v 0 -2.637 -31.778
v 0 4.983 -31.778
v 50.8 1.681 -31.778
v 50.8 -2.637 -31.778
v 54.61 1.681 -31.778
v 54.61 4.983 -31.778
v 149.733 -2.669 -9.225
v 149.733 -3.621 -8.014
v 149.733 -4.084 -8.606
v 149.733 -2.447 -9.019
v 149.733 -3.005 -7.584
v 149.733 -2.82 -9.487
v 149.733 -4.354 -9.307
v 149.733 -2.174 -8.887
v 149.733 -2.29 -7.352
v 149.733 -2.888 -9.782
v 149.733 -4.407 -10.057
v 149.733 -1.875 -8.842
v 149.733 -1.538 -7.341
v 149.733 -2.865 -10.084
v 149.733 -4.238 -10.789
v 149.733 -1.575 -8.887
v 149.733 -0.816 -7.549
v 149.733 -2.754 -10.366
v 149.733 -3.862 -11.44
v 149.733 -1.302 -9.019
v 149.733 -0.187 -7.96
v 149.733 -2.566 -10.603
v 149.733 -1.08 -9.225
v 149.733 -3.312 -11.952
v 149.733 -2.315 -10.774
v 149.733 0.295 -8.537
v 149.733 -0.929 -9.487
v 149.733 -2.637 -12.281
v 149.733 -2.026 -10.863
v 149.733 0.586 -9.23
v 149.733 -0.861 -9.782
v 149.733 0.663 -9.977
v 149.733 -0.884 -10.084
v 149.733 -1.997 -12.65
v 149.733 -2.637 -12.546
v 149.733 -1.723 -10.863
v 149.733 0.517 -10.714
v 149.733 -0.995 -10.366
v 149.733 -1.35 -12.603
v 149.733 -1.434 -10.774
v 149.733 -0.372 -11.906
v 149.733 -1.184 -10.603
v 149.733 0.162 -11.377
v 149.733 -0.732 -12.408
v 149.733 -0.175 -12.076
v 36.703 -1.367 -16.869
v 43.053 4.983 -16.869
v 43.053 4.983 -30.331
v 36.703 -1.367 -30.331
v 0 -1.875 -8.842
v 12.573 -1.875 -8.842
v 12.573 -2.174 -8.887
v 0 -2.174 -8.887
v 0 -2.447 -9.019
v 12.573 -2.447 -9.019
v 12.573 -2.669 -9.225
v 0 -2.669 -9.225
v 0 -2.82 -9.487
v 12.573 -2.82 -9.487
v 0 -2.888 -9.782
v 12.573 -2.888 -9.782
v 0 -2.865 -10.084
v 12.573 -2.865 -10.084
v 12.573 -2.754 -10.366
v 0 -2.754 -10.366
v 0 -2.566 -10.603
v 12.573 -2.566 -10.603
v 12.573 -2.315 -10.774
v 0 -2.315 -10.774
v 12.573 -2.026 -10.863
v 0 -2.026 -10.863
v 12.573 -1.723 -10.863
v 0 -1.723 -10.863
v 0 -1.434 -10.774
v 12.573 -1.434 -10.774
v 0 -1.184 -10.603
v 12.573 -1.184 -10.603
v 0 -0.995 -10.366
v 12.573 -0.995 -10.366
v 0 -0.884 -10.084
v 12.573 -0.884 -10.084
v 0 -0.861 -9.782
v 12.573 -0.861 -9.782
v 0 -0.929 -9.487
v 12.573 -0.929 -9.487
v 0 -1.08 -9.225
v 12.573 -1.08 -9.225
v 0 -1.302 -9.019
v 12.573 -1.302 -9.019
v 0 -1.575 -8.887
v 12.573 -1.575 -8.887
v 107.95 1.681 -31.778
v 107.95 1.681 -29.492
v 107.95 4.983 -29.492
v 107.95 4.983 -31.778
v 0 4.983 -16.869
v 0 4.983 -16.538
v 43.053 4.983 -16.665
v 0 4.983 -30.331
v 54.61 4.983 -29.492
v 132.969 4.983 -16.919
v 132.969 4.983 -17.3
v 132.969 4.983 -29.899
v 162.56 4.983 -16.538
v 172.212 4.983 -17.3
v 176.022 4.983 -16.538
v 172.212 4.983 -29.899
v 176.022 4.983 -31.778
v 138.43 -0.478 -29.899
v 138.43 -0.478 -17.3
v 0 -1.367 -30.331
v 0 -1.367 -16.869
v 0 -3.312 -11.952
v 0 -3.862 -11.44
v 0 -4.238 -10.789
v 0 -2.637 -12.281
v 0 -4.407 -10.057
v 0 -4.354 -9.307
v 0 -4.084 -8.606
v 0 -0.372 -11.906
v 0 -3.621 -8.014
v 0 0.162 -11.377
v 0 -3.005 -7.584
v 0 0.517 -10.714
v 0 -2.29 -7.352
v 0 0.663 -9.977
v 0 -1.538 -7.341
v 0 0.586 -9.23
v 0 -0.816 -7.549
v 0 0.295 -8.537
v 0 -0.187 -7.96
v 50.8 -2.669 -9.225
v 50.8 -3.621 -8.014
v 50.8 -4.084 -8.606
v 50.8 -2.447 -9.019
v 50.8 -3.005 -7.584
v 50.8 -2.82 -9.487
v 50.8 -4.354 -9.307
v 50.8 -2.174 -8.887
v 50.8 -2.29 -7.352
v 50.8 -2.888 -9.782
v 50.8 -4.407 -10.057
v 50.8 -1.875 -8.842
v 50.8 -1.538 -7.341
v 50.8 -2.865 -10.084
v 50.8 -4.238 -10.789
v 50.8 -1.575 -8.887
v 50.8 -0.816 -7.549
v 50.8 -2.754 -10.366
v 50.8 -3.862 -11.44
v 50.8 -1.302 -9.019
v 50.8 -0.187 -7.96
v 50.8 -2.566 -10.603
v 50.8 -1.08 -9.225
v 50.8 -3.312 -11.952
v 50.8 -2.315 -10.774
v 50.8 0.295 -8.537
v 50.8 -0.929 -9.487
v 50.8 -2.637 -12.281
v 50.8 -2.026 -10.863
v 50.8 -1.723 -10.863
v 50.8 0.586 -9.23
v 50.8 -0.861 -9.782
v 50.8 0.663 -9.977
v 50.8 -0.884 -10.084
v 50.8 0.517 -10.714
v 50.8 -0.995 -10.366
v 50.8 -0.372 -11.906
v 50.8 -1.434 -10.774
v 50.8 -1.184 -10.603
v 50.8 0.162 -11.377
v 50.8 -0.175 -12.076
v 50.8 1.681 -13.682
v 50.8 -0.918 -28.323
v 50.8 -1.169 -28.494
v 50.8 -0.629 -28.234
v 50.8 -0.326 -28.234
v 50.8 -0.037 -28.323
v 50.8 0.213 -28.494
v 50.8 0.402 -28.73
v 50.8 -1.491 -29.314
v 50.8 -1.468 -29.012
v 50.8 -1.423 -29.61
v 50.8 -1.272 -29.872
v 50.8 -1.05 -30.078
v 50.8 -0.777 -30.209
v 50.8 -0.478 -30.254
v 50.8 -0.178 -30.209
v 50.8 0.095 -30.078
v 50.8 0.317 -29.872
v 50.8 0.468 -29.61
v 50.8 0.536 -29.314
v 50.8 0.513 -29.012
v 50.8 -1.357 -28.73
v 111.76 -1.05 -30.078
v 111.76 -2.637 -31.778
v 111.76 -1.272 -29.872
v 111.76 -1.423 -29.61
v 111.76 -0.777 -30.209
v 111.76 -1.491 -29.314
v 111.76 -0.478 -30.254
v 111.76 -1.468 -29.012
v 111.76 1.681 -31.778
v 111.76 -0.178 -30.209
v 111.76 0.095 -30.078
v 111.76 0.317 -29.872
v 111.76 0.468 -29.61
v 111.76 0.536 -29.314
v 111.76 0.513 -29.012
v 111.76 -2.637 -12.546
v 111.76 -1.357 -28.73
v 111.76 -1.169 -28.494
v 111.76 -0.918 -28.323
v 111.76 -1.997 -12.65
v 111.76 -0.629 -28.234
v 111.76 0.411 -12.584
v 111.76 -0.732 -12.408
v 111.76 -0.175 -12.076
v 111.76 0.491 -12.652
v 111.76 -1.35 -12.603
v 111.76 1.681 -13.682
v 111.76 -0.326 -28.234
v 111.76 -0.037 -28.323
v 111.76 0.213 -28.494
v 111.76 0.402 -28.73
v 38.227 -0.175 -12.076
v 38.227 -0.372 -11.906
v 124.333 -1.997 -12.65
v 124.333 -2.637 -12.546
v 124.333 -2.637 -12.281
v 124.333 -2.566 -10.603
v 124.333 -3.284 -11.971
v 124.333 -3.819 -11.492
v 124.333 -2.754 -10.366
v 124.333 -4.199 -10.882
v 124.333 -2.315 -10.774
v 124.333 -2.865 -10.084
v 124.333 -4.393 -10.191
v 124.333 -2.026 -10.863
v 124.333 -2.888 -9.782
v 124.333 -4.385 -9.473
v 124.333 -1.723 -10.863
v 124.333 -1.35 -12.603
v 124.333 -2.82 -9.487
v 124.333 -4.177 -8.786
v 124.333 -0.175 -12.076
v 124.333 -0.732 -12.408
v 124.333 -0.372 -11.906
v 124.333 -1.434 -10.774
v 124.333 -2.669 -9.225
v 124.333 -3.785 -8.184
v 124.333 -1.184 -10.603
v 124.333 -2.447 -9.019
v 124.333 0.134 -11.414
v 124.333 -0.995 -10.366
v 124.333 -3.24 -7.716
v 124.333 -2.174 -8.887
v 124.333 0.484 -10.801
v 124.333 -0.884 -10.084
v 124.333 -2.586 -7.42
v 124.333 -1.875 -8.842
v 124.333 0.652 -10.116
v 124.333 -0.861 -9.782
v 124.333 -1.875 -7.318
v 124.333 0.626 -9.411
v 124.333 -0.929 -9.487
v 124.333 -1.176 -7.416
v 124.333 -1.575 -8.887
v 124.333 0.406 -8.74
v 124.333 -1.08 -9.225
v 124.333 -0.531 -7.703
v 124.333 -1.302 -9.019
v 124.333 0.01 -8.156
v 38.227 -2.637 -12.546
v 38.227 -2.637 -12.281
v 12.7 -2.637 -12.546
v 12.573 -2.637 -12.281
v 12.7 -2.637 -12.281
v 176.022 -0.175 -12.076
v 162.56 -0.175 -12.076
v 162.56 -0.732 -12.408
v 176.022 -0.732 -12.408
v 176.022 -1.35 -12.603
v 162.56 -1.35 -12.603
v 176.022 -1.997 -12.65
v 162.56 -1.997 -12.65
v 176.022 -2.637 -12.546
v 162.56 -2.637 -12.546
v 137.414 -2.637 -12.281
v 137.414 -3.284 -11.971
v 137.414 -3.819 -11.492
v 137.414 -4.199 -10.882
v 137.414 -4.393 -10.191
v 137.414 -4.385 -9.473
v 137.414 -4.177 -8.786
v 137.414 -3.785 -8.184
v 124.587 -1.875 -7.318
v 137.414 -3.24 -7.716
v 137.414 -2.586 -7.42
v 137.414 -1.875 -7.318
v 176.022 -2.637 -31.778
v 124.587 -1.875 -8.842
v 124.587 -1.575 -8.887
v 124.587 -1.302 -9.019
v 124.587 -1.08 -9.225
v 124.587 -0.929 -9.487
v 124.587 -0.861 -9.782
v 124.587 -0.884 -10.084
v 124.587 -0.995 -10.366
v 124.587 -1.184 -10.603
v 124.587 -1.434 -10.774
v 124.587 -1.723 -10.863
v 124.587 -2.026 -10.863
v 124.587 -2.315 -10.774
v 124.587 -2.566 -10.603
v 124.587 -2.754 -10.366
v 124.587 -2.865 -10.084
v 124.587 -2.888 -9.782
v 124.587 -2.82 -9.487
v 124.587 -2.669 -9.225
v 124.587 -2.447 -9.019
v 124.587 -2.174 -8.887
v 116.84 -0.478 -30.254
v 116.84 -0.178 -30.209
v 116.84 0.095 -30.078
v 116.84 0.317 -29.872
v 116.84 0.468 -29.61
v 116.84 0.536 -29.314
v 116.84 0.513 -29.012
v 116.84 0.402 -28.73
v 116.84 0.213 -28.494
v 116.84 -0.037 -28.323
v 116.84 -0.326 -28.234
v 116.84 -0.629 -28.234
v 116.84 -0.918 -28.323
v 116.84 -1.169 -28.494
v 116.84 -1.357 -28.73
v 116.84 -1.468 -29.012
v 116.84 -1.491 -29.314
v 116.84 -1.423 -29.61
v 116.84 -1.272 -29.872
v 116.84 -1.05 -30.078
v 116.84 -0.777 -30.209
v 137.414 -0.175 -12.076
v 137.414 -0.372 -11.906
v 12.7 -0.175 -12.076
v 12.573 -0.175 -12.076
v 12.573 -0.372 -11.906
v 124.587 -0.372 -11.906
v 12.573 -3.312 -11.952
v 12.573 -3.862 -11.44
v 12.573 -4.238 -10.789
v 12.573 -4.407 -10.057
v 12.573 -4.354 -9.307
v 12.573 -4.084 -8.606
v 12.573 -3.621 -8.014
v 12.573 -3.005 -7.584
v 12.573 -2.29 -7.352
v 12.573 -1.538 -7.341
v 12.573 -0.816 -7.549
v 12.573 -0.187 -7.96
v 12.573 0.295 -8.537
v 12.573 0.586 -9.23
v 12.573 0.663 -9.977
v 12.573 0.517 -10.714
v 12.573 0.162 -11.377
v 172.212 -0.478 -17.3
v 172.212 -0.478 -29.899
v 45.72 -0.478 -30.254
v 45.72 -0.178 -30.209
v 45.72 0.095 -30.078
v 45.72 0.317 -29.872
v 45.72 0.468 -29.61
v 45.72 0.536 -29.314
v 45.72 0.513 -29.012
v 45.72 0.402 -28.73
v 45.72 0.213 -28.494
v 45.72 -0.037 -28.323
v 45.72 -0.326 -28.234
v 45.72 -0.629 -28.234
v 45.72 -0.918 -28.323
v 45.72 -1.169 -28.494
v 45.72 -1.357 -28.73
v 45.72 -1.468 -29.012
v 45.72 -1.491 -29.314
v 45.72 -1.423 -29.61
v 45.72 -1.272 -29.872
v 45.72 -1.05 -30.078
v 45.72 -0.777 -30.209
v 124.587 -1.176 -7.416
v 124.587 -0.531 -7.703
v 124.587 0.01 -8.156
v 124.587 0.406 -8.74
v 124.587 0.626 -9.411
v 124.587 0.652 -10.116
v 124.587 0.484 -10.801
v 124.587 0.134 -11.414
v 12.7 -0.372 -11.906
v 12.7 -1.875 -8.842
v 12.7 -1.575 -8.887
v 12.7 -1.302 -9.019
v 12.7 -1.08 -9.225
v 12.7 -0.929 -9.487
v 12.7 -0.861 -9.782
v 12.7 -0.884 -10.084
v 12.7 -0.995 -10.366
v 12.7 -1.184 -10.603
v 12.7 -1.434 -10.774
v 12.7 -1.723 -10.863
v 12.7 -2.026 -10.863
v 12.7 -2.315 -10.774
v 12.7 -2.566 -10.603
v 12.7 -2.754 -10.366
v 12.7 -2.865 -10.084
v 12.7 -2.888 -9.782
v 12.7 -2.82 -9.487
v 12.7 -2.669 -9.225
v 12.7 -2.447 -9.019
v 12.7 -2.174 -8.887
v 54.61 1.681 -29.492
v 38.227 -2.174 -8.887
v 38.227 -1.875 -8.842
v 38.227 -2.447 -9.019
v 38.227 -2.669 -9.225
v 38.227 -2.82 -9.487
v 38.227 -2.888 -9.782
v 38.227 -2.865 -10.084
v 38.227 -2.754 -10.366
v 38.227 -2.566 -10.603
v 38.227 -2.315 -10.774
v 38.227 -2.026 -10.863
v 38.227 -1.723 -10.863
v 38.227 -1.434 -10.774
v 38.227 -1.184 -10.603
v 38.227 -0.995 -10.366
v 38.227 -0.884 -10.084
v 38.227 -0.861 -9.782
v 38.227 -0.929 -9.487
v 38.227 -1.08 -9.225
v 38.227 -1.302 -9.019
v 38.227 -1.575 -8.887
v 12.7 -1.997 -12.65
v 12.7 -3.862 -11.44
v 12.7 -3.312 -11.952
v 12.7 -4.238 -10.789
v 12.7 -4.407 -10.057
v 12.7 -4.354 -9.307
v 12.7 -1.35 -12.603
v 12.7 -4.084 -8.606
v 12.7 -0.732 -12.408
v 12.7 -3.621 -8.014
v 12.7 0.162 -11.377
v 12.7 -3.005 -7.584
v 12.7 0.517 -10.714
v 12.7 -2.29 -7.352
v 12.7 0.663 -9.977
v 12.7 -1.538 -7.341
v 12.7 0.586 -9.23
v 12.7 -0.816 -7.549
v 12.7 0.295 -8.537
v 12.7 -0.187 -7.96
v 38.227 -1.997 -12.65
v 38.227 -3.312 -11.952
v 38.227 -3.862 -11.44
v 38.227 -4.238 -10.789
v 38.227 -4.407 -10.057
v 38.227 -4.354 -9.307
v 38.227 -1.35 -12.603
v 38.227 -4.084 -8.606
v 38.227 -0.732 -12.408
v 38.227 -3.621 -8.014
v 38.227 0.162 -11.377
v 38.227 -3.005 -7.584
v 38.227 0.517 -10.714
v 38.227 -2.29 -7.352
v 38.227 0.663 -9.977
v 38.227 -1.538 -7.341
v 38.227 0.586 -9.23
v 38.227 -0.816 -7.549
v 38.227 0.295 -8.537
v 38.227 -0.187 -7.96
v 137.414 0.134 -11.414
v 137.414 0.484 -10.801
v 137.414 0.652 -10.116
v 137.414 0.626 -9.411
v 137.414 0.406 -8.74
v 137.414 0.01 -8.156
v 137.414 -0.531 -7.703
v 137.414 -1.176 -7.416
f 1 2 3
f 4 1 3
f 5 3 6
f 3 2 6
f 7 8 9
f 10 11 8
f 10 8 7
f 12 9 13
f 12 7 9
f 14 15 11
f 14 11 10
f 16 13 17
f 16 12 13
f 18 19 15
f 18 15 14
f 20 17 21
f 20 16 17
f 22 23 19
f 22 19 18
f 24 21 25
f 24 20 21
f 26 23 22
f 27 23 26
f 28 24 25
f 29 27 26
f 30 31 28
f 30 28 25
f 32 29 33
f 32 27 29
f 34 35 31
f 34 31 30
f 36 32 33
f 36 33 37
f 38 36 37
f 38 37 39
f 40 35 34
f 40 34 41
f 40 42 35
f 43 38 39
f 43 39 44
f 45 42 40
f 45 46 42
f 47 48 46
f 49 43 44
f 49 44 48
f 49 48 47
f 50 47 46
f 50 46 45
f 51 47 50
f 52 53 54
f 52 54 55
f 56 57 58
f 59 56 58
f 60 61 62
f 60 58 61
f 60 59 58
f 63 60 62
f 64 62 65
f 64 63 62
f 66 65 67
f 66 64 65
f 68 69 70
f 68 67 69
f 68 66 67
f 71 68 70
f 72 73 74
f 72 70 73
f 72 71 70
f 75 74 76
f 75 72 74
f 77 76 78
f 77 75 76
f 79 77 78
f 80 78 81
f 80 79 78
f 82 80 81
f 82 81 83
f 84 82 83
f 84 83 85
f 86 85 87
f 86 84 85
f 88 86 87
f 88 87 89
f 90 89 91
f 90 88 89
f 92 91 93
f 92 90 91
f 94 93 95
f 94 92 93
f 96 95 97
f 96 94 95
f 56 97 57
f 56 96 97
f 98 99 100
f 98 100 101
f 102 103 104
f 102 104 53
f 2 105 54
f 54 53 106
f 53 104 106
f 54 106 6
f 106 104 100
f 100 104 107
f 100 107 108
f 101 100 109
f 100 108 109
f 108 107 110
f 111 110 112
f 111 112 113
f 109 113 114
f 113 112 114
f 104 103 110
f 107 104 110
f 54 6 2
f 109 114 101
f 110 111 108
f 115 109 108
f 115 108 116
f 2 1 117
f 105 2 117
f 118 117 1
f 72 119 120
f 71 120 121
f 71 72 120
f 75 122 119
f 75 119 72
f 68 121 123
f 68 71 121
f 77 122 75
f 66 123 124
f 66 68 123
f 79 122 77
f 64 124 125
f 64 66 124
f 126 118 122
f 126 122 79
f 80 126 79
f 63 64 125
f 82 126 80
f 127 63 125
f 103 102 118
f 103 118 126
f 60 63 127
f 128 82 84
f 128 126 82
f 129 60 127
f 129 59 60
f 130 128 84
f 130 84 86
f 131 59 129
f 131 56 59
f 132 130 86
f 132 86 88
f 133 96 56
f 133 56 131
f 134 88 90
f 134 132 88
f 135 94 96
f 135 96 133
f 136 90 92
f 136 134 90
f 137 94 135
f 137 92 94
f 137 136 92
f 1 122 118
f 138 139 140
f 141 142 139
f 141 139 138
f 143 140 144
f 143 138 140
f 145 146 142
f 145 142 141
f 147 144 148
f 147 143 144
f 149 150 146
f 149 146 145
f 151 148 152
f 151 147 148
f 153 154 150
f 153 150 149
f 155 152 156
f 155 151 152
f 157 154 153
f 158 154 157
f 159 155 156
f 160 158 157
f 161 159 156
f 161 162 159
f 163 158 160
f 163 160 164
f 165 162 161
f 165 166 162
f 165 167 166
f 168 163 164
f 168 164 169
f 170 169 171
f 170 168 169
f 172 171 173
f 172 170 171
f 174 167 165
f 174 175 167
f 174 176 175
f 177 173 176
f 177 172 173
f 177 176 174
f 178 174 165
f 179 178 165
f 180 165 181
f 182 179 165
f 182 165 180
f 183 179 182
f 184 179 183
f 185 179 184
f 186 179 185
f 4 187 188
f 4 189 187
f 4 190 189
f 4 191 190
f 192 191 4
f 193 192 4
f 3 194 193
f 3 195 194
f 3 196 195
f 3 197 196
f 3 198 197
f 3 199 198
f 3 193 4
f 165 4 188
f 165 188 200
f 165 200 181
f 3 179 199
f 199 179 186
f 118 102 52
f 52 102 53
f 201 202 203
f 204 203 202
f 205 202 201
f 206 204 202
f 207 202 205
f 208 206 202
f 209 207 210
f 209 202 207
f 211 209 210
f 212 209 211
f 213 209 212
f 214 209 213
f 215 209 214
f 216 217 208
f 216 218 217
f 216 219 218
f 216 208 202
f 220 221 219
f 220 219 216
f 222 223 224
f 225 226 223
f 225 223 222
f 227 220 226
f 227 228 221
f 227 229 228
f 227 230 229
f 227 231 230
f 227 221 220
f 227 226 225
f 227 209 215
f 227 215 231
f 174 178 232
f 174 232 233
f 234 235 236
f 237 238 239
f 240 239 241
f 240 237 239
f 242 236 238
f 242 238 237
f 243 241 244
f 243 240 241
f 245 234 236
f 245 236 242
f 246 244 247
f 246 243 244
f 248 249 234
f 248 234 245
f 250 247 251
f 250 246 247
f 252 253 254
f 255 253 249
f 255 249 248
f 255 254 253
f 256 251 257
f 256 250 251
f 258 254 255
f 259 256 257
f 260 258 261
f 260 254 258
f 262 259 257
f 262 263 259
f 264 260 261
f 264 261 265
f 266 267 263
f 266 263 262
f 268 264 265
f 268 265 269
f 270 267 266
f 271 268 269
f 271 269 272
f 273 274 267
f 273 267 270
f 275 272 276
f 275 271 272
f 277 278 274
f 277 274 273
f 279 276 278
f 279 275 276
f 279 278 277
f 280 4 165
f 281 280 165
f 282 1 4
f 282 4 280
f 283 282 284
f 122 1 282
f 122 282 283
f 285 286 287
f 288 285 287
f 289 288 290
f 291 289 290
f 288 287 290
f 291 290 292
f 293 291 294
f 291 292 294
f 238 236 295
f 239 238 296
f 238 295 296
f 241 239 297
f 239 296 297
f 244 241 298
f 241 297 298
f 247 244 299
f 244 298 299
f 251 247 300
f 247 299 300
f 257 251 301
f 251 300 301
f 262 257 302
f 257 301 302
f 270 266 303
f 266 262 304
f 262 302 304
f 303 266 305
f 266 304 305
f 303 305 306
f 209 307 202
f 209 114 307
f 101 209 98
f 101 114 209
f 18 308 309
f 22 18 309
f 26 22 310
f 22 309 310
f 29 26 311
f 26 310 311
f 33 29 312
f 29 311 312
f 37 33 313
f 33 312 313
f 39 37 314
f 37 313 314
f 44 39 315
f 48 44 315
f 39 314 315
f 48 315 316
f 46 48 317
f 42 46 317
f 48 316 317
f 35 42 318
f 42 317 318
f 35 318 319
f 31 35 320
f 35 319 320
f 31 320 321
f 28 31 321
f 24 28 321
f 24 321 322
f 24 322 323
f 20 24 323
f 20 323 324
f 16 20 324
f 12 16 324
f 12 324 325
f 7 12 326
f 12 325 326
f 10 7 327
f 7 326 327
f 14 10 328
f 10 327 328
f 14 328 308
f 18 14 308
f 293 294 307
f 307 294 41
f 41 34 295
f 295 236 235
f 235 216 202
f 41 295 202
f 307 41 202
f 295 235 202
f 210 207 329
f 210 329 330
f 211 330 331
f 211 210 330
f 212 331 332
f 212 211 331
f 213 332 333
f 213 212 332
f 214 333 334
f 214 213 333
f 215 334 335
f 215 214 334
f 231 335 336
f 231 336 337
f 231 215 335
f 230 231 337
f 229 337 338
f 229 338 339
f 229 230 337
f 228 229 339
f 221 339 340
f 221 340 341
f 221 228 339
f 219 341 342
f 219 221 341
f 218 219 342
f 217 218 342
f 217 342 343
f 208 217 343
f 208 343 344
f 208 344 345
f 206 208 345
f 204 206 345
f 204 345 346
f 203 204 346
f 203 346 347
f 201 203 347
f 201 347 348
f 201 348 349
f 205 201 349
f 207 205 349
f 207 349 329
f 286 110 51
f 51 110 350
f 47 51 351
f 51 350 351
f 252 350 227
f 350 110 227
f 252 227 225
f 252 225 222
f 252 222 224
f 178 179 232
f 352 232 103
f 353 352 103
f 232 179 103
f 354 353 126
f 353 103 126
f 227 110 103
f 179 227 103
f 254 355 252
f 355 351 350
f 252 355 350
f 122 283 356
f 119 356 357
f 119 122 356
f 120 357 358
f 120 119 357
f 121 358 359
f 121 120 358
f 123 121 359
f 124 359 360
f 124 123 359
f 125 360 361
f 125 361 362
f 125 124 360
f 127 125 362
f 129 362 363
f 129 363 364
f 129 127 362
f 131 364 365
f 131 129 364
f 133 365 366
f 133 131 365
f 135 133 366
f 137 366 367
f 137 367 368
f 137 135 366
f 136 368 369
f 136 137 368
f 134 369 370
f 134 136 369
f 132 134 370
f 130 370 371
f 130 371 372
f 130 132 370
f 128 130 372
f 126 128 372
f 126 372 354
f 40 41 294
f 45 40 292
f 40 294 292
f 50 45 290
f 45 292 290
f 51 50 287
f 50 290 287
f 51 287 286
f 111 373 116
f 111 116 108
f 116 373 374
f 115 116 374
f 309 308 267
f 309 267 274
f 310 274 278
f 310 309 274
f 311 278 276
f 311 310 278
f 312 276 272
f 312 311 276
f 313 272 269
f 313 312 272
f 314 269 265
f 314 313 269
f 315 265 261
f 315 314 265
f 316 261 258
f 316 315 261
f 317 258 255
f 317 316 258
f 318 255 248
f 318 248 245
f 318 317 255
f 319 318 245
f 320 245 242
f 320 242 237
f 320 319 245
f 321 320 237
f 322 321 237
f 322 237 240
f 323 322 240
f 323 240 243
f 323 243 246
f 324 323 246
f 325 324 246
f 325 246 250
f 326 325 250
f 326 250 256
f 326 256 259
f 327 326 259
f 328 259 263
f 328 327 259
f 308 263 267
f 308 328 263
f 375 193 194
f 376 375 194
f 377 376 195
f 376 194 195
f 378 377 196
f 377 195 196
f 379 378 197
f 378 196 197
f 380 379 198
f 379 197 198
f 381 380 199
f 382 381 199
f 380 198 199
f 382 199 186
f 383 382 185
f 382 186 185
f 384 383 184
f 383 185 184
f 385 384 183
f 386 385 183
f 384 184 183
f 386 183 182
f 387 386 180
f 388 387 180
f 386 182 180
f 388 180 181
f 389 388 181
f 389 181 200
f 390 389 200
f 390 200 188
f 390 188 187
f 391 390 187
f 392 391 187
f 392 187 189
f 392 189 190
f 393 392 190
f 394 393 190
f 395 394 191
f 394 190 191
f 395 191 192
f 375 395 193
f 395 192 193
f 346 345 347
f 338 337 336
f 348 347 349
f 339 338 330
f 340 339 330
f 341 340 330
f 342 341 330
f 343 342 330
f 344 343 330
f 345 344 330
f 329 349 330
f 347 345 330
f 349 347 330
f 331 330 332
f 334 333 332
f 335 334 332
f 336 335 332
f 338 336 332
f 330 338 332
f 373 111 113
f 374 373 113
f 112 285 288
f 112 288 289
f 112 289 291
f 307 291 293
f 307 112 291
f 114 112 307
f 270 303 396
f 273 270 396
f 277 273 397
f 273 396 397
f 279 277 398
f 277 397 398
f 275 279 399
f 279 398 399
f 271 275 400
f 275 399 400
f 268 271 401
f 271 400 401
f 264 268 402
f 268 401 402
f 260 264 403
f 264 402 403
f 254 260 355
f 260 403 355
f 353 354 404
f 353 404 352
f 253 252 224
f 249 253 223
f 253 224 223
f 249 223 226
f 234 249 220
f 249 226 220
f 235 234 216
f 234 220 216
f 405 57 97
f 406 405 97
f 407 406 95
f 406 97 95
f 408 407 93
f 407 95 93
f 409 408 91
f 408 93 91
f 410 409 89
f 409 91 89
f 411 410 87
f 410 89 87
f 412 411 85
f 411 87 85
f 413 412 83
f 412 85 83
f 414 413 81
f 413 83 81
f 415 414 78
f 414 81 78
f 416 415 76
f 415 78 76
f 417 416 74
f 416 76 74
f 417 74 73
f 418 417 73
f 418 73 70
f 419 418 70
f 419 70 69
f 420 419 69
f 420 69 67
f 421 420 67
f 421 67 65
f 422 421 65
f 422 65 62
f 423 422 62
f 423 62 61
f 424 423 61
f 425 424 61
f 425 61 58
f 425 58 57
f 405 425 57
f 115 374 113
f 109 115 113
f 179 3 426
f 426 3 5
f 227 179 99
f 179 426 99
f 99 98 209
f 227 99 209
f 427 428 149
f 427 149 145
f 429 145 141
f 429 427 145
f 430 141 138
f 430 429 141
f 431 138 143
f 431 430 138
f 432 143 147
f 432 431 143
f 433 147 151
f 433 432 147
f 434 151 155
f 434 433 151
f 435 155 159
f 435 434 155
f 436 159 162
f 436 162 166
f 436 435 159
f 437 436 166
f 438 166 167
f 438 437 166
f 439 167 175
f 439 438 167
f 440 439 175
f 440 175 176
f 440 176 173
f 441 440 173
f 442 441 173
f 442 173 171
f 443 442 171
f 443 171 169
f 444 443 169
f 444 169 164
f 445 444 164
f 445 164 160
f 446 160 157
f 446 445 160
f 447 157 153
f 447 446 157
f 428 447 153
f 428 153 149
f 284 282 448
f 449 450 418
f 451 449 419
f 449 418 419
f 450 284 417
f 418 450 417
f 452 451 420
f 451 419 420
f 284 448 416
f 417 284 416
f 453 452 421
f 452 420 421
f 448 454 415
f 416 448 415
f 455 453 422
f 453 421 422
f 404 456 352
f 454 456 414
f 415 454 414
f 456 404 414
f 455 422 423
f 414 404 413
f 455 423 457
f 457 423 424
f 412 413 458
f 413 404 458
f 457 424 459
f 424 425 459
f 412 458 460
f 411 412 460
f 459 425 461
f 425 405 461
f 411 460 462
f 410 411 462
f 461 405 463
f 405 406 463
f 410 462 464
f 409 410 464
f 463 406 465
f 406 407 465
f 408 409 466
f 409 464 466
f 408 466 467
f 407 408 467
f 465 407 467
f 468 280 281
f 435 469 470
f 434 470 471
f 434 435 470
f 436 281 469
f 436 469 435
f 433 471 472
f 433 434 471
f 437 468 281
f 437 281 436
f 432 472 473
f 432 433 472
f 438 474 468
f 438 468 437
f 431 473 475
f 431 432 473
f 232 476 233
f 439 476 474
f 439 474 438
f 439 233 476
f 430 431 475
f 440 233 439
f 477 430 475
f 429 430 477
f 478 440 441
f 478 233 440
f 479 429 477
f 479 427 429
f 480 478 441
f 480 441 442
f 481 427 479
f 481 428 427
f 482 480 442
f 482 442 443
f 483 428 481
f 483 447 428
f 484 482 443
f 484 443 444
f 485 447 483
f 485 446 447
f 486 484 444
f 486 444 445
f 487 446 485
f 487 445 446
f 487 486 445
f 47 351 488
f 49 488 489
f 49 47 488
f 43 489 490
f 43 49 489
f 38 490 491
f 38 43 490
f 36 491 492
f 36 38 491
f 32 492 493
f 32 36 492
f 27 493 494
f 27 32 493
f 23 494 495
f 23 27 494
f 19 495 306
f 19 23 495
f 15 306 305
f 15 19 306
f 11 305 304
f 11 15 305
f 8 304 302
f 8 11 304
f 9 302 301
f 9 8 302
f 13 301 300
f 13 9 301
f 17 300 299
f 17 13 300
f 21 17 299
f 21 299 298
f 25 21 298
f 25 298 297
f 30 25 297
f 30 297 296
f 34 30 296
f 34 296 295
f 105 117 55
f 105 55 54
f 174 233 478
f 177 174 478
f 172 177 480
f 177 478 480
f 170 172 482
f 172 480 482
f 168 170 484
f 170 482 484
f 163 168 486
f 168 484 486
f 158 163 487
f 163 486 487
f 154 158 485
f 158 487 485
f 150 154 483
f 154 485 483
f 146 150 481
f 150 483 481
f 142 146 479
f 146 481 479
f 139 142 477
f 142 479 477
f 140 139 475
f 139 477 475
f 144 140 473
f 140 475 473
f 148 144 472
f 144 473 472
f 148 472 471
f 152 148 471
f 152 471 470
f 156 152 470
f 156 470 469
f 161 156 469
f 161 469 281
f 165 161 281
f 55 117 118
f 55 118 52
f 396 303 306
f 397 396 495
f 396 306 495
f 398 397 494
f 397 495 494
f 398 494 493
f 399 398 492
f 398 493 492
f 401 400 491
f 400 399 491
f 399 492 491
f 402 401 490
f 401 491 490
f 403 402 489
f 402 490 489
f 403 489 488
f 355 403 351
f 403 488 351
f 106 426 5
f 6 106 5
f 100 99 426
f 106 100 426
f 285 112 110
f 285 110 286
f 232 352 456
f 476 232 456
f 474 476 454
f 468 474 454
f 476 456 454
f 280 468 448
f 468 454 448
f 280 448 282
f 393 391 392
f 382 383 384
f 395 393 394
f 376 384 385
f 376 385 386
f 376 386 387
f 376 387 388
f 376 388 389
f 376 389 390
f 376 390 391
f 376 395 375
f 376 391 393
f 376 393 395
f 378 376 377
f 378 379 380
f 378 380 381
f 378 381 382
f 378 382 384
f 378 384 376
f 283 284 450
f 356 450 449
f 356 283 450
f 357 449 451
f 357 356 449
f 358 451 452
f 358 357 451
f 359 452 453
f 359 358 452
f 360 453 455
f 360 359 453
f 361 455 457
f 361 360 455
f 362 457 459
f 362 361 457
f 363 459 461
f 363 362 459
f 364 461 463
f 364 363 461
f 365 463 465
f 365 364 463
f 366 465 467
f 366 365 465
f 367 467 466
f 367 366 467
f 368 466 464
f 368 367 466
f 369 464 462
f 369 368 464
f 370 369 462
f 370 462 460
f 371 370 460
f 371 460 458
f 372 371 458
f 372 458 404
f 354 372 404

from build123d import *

# Parameters (mm, degrees)
SKETCH1_R                = 1.6002
SKETCH1_R_2              = 0.8128
BOSS_EXTRUDE5_DEPTH      = 162.56
CUT_EXTRUDE1_DEPTH       = 14.351
SKETCH3_W                = 0.889
SKETCH3_H                = 5.842
BOSS_EXTRUDE6_DEPTH      = 36.957
SKETCH16_W               = 13.462
SKETCH16_H               = 6.460130881
BOSS_EXTRUDE7_DEPTH      = 33.02
CUT_EXTRUDE4_DEPTH       = 15.24
SKETCH18_W               = 1.778
SKETCH18_H               = 5.842
BOSS_EXTRUDE8_DEPTH      = 38.1
CUT_EXTRUDE5_DEPTH       = 14.224
SKETCH20_W               = 2.1336
SKETCH20_H               = 5.461
BOSS_EXTRUDE9_DEPTH      = 36.322
SKETCH22_R               = 1.4224
CUT_EXTRUDE7_DEPTH       = 20.32
CUT_EXTRUDE7_DEPTH_BACK  = 24.13
SKETCH25_W               = 112.268
SKETCH25_H               = 3.007323321
CUT_EXTRUDE8_DEPTH       = 24.13
SKETCH27_R               = 1.778
CUT_EXTRUDE9_DEPTH       = 112.268
CUT_EXTRUDE12_DEPTH      = 14.224
SKETCH34_W               = 43.053
SKETCH34_H               = 2.1336
BOSS_EXTRUDE14_DEPTH     = 7.112
SKETCH35_R               = 1.4224
CUT_EXTRUDE13_DEPTH      = 7.112
SKETCH37_W               = 60.96
SKETCH37_H               = 15.24
CUT_EXTRUDE14_DEPTH      = 3.048
SKETCH38_R               = 0.8128
CUT_EXTRUDE15_DEPTH      = 5.08
SKETCH39_R               = 0.8128
CUT_EXTRUDE16_DEPTH      = 5.08
SKETCH40_W               = 60.96
SKETCH40_H               = 2.54
CUT_EXTRUDE17_DEPTH      = 3.048
SKETCH41_R               = 1.161307013
BOSS_EXTRUDE15_DEPTH     = 6.604
SKETCH42_R               = 1.020818471
BOSS_EXTRUDE16_DEPTH     = 5.588
SKETCH43_R               = 0.8128
CUT_EXTRUDE18_DEPTH      = 5.08
SKETCH44_R               = 0.8128
CUT_EXTRUDE19_DEPTH      = 5.08
SKETCH46_W               = 60.96
SKETCH46_H               = 9.087986699
CUT_EXTRUDE21_DEPTH      = 3.048
SKETCH47_W               = 53.34
SKETCH47_H               = 2.286
CUT_EXTRUDE22_DEPTH      = 15.24
SKETCH48_R               = 2.54
BOSS_EXTRUDE17_DEPTH     = 25.146
SKETCH49_R               = 2.54
BOSS_EXTRUDE18_DEPTH     = 25.146
SKETCH50_R               = 2.794
CUT_EXTRUDE23_DEPTH      = 112.268
SKETCH51_R               = 1.27
CUT_EXTRUDE24_DEPTH      = 174.498
CUT_EXTRUDE25_DEPTH      = 1.27
SKETCH55_W               = 46.703523857
SKETCH55_H               = 5.873481267
CUT_EXTRUDE26_DEPTH      = 9.144
CUT_EXTRUDE26_DEPTH_BACK = 8.636
SKETCH57_R               = 1.029255476
BOSS_EXTRUDE20_DEPTH     = 5.08
SKETCH58_R               = 1.09273592
BOSS_EXTRUDE21_DEPTH     = 7.112
SKETCH59_R               = 1.016
CUT_EXTRUDE27_DEPTH      = 66.04
CUT_EXTRUDE27_DEPTH_BACK = 5.08
SKETCH60_R               = 1.869467668
SKETCH60_R_2             = 1.016
BOSS_EXTRUDE22_DEPTH     = 162.56
SKETCH61_R               = 2.219373527
CUT_EXTRUDE28_DEPTH      = 112.268
SKETCH62_R               = 1.016
BOSS_EXTRUDE26_DEPTH     = 25.654
SKETCH65_R               = 1.016
BOSS_EXTRUDE27_DEPTH     = 25.654
SKETCH67_R               = 2.794
CUT_EXTRUDE32_DEPTH      = 12.827
SKETCH68_R               = 2.794
CUT_EXTRUDE33_DEPTH      = 12.827
SKETCH72_R               = 2.794
CUT_EXTRUDE34_DEPTH      = 25.654
BOSS_EXTRUDE28_DEPTH     = 0.127
SKETCH77_R               = 1.016
BOSS_EXTRUDE29_DEPTH     = 0.254
SKETCH79_R               = 1.016
CUT_EXTRUDE35_DEPTH      = 15.748
SKETCH87_W               = 23.622
SKETCH87_H               = 13.462
BOSS_EXTRUDE30_DEPTH     = 6.096
CUT_EXTRUDE36_DEPTH      = 14.9098
SKETCH89_W               = 1.4478
SKETCH89_H               = 6.35
BOSS_EXTRUDE31_DEPTH     = 30.6578
SKETCH92_W               = 12.0904
SKETCH92_H               = 7.62
BOSS_EXTRUDE33_DEPTH     = 43.18
BOSS_EXTRUDE34_DEPTH     = 13.462
SKETCH95_W               = 13.462
SKETCH95_H               = 6.35
CUT_EXTRUDE37_DEPTH      = 43.053
BOSS_EXTRUDE35_DEPTH     = 15.113
SKETCH97_W               = 12.5984
SKETCH97_H               = 5.461
CUT_EXTRUDE38_DEPTH      = 43.053
BOSS_EXTRUDE36_DEPTH     = 14.859
SKETCH99_W               = 12.5984
SKETCH99_H               = 5.461
BOSS_EXTRUDE37_DEPTH     = 3.81


with BuildPart() as part:
    # Sketch1 → Boss-Extrude5 (new body)
    with BuildSketch(Plane(origin=(0, 0, 0), x_dir=(0, 0, -1), z_dir=(1, 0, 0))):
        with BuildLine():
            ThreePointArc((11.4584801, -1.874600251), (11.409460099, -2.267640517), (11.265403421, -2.636600251))
            Line((11.265403421, -2.636600251), (11.4584801, -2.636600251))
            Line((11.4584801, -2.636600251), (31.7784801, -2.636600251))
            Line((31.7784801, -2.636600251), (31.7784801, 4.983399749))
            Line((31.7784801, 4.983399749), (16.5384801, 4.983399749))
            Line((16.5384801, 4.983399749), (11.265403421, -1.112600251))
            ThreePointArc((11.265403421, -1.112600251), (11.409460099, -1.481559985), (11.4584801, -1.874600251))
        make_face()
        with Locations((9.8582801, -1.874600251)):
            Circle(SKETCH1_R)
        with Locations((9.8582801, -1.874600251)):
            Circle(SKETCH1_R_2, mode=Mode.SUBTRACT)
    extrude(amount=BOSS_EXTRUDE5_DEPTH)

    # Sketch2 → Cut-Extrude1 (cut)
    with BuildSketch(Plane(origin=(0, 0, -31.7784801), x_dir=(-1, 0, 0), z_dir=(0, 0, -1))):
        Polygon((0, 4.983399749), (0, -0.858600251), (-17.78, -0.858600251), (-23.622, 4.983399749), align=None)
    extrude(amount=-CUT_EXTRUDE1_DEPTH, mode=Mode.SUBTRACT)

    # Sketch3 → Boss-Extrude6 (add)
    with BuildSketch(Plane.ZY):
        with Locations((-31.3339801, 2.062399749)):
            Rectangle(SKETCH3_W, SKETCH3_H)
    extrude(amount=-BOSS_EXTRUDE6_DEPTH)

    # Sketch16 → Boss-Extrude7 (add)
    with BuildSketch(Plane.ZY):
        with Locations((-24.1584801, 1.753334308)):
            Rectangle(SKETCH16_W, SKETCH16_H)
    extrude(amount=-BOSS_EXTRUDE7_DEPTH)

    # Sketch17 → Cut-Extrude4 (cut)
    with BuildSketch(Plane(origin=(0, 0, -31.7784801), x_dir=(-1, 0, 0), z_dir=(0, 0, -1))):
        Polygon((0, 4.983399749), (0, -0.858600251), (-17.78, -0.858600251), (-23.622, 4.983399749), align=None)
    extrude(amount=-CUT_EXTRUDE4_DEPTH, mode=Mode.SUBTRACT)

    # Sketch18 → Boss-Extrude8 (add)
    with BuildSketch(Plane.ZY):
        with Locations((-30.8894801, 2.062399749)):
            Rectangle(SKETCH18_W, SKETCH18_H)
    extrude(amount=-BOSS_EXTRUDE8_DEPTH)

    # Sketch19 → Cut-Extrude5 (cut)
    with BuildSketch(Plane(origin=(0, 0, -31.7784801), x_dir=(-1, 0, 0), z_dir=(0, 0, -1))):
        Polygon((-162.56, 4.983399749), (-162.56, -0.477600251), (-142.24, -0.477600251), (-136.779, 4.983399749), align=None)
    extrude(amount=-CUT_EXTRUDE5_DEPTH, mode=Mode.SUBTRACT)

    # Sketch20 → Boss-Extrude9 (add)
    with BuildSketch(Plane(origin=(162.56, 0, 0), x_dir=(0, 0, -1), z_dir=(1, 0, 0))):
        with Locations((30.7116801, 2.252899749)):
            Rectangle(SKETCH20_W, SKETCH20_H)
    extrude(amount=-BOSS_EXTRUDE9_DEPTH)

    # Sketch22 → Cut-Extrude7 (cut, two sides)
    with BuildSketch(Plane(origin=(0, -0.477600251, 0), x_dir=(1, 0, 0), z_dir=(0, 1, 0))) as cut_extrude7_sk:
        with Locations((145.9484, 26.5714801)):
            Circle(SKETCH22_R)
        with BuildLine():
            ThreePointArc((147.3708, 26.5714801), (146.954188686, 25.565691415), (145.9484, 25.1490801))
            Line((145.9484, 25.1490801), (157.217057139, 25.1490801))
            ThreePointArc((157.217057139, 25.1490801), (155.794657139, 26.5714801), (157.217057139, 27.9938801))
            Line((157.217057139, 27.9938801), (145.9484, 27.9938801))
            ThreePointArc((145.9484, 27.9938801), (146.954188686, 27.577268786), (147.3708, 26.5714801))
        make_face()
        with Locations((157.217057139, 26.5714801)):
            Circle(SKETCH22_R)
        with BuildLine():
            ThreePointArc((157.217057139, 19.1292801), (155.794657139, 20.5516801), (157.217057139, 21.9740801))
            Line((157.217057139, 21.9740801), (145.9484, 21.9740801))
            ThreePointArc((145.9484, 21.9740801), (146.954188686, 21.557468786), (147.3708, 20.5516801))
            ThreePointArc((147.3708, 20.5516801), (146.954188686, 19.545891415), (145.9484, 19.1292801))
            Line((145.9484, 19.1292801), (157.217057139, 19.1292801))
        make_face()
        with Locations((157.217057139, 20.5516801)):
            Circle(SKETCH22_R)
        with Locations((145.9484, 20.5516801)):
            Circle(SKETCH22_R)
    extrude(amount=CUT_EXTRUDE7_DEPTH, mode=Mode.SUBTRACT)
    extrude(cut_extrude7_sk.sketch, amount=-CUT_EXTRUDE7_DEPTH_BACK, mode=Mode.SUBTRACT)

    # Sketch25 → Cut-Extrude8 (cut)
    with BuildSketch(Plane(origin=(0, 4.983399749, 0), x_dir=(1, 0, 0), z_dir=(0, 1, 0))):
        with Locations((81.28, 9.761741761)):
            Rectangle(SKETCH25_W, SKETCH25_H)
    extrude(amount=-CUT_EXTRUDE8_DEPTH, mode=Mode.SUBTRACT)

    # Sketch27 → Cut-Extrude9 (cut)
    with BuildSketch(Plane.ZY.offset(-137.414)):
        with Locations((-9.8582801, -1.874600251)):
            Circle(SKETCH27_R)
    extrude(amount=CUT_EXTRUDE9_DEPTH, mode=Mode.SUBTRACT)

    # Sketch31 → Cut-Extrude12 (cut)
    with BuildSketch(Plane(origin=(0, 0, -31.7784801), x_dir=(-1, 0, 0), z_dir=(0, 0, -1))):
        Polygon((-162.56, 4.983399749), (-162.56, -0.477600251), (-124.968, -0.477600251), (-119.507, 4.983399749), (-124.079, 4.983399749), align=None)
    extrude(amount=-CUT_EXTRUDE12_DEPTH, mode=Mode.SUBTRACT)

    # Sketch34 → Boss-Extrude14 (add)
    with BuildSketch(Plane(origin=(0, 4.983399749, 0), x_dir=(1, 0, 0), z_dir=(0, 1, 0))):
        with Locations((141.0335, 30.7116801)):
            Rectangle(SKETCH34_W, SKETCH34_H)
    extrude(amount=-BOSS_EXTRUDE14_DEPTH)

    # Sketch35 → Cut-Extrude13 (cut)
    with BuildSketch(Plane(origin=(0, -0.477600251, 0), x_dir=(1, 0, 0), z_dir=(0, 1, 0))):
        with BuildLine():
            Line((130.048, 25.1490801), (145.9484, 25.1490801))
            ThreePointArc((145.9484, 25.1490801), (144.526, 26.5714801), (145.9484, 27.9938801))
            Line((145.9484, 27.9938801), (130.048, 27.9938801))
            ThreePointArc((130.048, 27.9938801), (131.053788686, 27.577268786), (131.4704, 26.5714801))
            ThreePointArc((131.4704, 26.5714801), (131.053788686, 25.565691415), (130.048, 25.1490801))
        make_face()
        with BuildLine():
            ThreePointArc((145.9484, 19.1292801), (144.526, 20.5516801), (145.9484, 21.9740801))
            Line((145.9484, 21.9740801), (130.048, 21.9740801))
            ThreePointArc((130.048, 21.9740801), (131.053788686, 21.557468786), (131.4704, 20.5516801))
            ThreePointArc((131.4704, 20.5516801), (131.053788686, 19.545891415), (130.048, 19.1292801))
            Line((130.048, 19.1292801), (145.9484, 19.1292801))
        make_face()
        with Locations((130.048, 20.5516801)):
            Circle(SKETCH35_R)
        with Locations((130.048, 26.5714801)):
            Circle(SKETCH35_R)
    extrude(amount=-CUT_EXTRUDE13_DEPTH, mode=Mode.SUBTRACT)

    # Sketch37 → Cut-Extrude14 (cut)
    with BuildSketch(Plane(origin=(0, -2.636600251, 0), x_dir=(-1, 0, 0), z_dir=(0, -1, 0))):
        with Locations((-81.28, 21.6184801)):
            Rectangle(SKETCH37_W, SKETCH37_H)
    extrude(amount=-CUT_EXTRUDE14_DEPTH, mode=Mode.SUBTRACT)

    # Sketch38 → Cut-Extrude15 (cut)
    with BuildSketch(Plane.ZY.offset(-111.76)):
        with Locations((-27.9684801, -1.112600251)):
            Circle(SKETCH38_R)
    extrude(amount=-CUT_EXTRUDE15_DEPTH, mode=Mode.SUBTRACT)

    # Sketch39 → Cut-Extrude16 (cut)
    with BuildSketch(Plane(origin=(50.8, 0, 0), x_dir=(0, 0, -1), z_dir=(1, 0, 0))):
        with Locations(Location((27.9684801, -1.112600251, 0), (0, 0, 180))):
            Circle(SKETCH39_R)
    extrude(amount=-CUT_EXTRUDE16_DEPTH, mode=Mode.SUBTRACT)

    # Sketch40 → Cut-Extrude17 (cut)
    with BuildSketch(Plane(origin=(0, -2.636600251, 0), x_dir=(-1, 0, 0), z_dir=(0, -1, 0))):
        with Locations((-81.28, 30.5084801)):
            Rectangle(SKETCH40_W, SKETCH40_H)
    extrude(amount=-CUT_EXTRUDE17_DEPTH, mode=Mode.SUBTRACT)

    # Sketch41 → Boss-Extrude15 (add)
    with BuildSketch(Plane(origin=(50.8, 0, 0), x_dir=(0, 0, -1), z_dir=(1, 0, 0))):
        with Locations((27.9684801, -1.112600251)):
            Circle(SKETCH41_R)
    extrude(amount=-BOSS_EXTRUDE15_DEPTH)

    # Sketch42 → Boss-Extrude16 (add)
    with BuildSketch(Plane.ZY.offset(-111.76)):
        with Locations((-27.9684801, -1.112600251)):
            Circle(SKETCH42_R)
    extrude(amount=-BOSS_EXTRUDE16_DEPTH)

    # Sketch43 → Cut-Extrude18 (cut)
    with BuildSketch(Plane(origin=(50.8, 0, 0), x_dir=(0, 0, -1), z_dir=(1, 0, 0))):
        with Locations((30.5084801, -1.112600251)):
            Circle(SKETCH43_R)
    extrude(amount=-CUT_EXTRUDE18_DEPTH, mode=Mode.SUBTRACT)

    # Sketch44 → Cut-Extrude19 (cut)
    with BuildSketch(Plane.ZY.offset(-111.76)):
        with Locations(Location((-30.5084801, -1.112600251, 0), (0, 0, 180))):
            Circle(SKETCH44_R)
    extrude(amount=-CUT_EXTRUDE19_DEPTH, mode=Mode.SUBTRACT)

    # Sketch46 → Cut-Extrude21 (cut)
    with BuildSketch(Plane(origin=(0, -2.636600251, 0), x_dir=(-1, 0, 0), z_dir=(0, -1, 0))):
        with Locations((-81.28, 9.45448675)):
            Rectangle(SKETCH46_W, SKETCH46_H)
    extrude(amount=-CUT_EXTRUDE21_DEPTH, mode=Mode.SUBTRACT)

    # Sketch47 → Cut-Extrude22 (cut)
    with BuildSketch(Plane(origin=(0, 0.411399749, 0), x_dir=(-1, 0, 0), z_dir=(0, -1, 0))):
        with Locations((-81.28, 30.6354801)):
            Rectangle(SKETCH47_W, SKETCH47_H)
    extrude(amount=-CUT_EXTRUDE22_DEPTH, mode=Mode.SUBTRACT)

    # Sketch48 → Boss-Extrude17 (add)
    with BuildSketch(Plane.ZY):
        with Locations((-9.8582801, -1.874600251)):
            Circle(SKETCH48_R)
    extrude(amount=-BOSS_EXTRUDE17_DEPTH)

    # Sketch49 → Boss-Extrude18 (add)
    with BuildSketch(Plane(origin=(162.56, 0, 0), x_dir=(0, 0, -1), z_dir=(1, 0, 0))):
        with Locations((9.8582801, -1.874600251)):
            Circle(SKETCH49_R)
    extrude(amount=-BOSS_EXTRUDE18_DEPTH)

    # Sketch50 → Cut-Extrude23 (cut)
    with BuildSketch(Plane.ZY.offset(-137.414)):
        with Locations((-9.8582801, -1.874600251)):
            Circle(SKETCH50_R)
    extrude(amount=CUT_EXTRUDE23_DEPTH, mode=Mode.SUBTRACT)

    # Sketch51 → Cut-Extrude24 (cut)
    with BuildSketch(Plane(origin=(162.56, 0, 0), x_dir=(0, 0, -1), z_dir=(1, 0, 0))):
        with Locations((9.8582801, -1.874600251)):
            Circle(SKETCH51_R)
    extrude(amount=-CUT_EXTRUDE24_DEPTH, mode=Mode.SUBTRACT)

    # Sketch52 → Cut-Extrude25 (cut)
    with BuildSketch(Plane(origin=(0, 0.411399749, 0), x_dir=(-1, 0, 0), z_dir=(0, -1, 0))):
        Polygon((-50.8, 31.7784801), (-50.8, 12.546363432), (-111.76, 12.6522801), (-111.76, 31.7784801), align=None)
    extrude(amount=-CUT_EXTRUDE25_DEPTH, mode=Mode.SUBTRACT)

    # Sketch55 → Cut-Extrude26 (cut, two sides)
    with BuildSketch(Plane.XZ.offset(2.636600251)) as cut_extrude26_sk:
        with Locations((88.408238071, -10.745489599)):
            Rectangle(SKETCH55_W, SKETCH55_H)
    extrude(amount=CUT_EXTRUDE26_DEPTH, mode=Mode.SUBTRACT)
    extrude(cut_extrude26_sk.sketch, amount=-CUT_EXTRUDE26_DEPTH_BACK, mode=Mode.SUBTRACT)

    # Sketch57 → Boss-Extrude20 (add)
    with BuildSketch(Plane(origin=(45.72, 0, 0), x_dir=(0, 0, -1), z_dir=(1, 0, 0))):
        with Locations((30.5084801, -1.112600251)):
            Circle(SKETCH57_R)
    extrude(amount=BOSS_EXTRUDE20_DEPTH)

    # Sketch58 → Boss-Extrude21 (add)
    with BuildSketch(Plane.ZY.offset(-111.76)):
        with Locations((-30.5084801, -1.112600251)):
            Circle(SKETCH58_R)
    extrude(amount=-BOSS_EXTRUDE21_DEPTH)

    # Sketch59 → Cut-Extrude27 (cut, two sides)
    with BuildSketch(Plane(origin=(50.8, 0, 0), x_dir=(0, 0, -1), z_dir=(1, 0, 0))) as cut_extrude27_sk:
        with Locations((29.2384801, -0.477600251)):
            Circle(SKETCH59_R)
    extrude(amount=CUT_EXTRUDE27_DEPTH, mode=Mode.SUBTRACT)
    extrude(cut_extrude27_sk.sketch, amount=-CUT_EXTRUDE27_DEPTH_BACK, mode=Mode.SUBTRACT)

    # Sketch60 → Boss-Extrude22 (add)
    with BuildSketch(Plane.ZY):
        with Locations((-9.8582801, -1.874600251)):
            Circle(SKETCH60_R)
        with Locations((-9.8582801, -1.874600251)):
            Circle(SKETCH60_R_2, mode=Mode.SUBTRACT)
    extrude(amount=-BOSS_EXTRUDE22_DEPTH)

    # Sketch61 → Cut-Extrude28 (cut)
    with BuildSketch(Plane.ZY.offset(-137.414)):
        with Locations((-9.8582801, -1.874600251)):
            Circle(SKETCH61_R)
    extrude(amount=CUT_EXTRUDE28_DEPTH, mode=Mode.SUBTRACT)

    # Sketch62 → Boss-Extrude26 (add)
    with BuildSketch(Plane(origin=(25.146, 0, 0), x_dir=(0, 0, -1), z_dir=(1, 0, 0))):
        with BuildLine():
            Line((12.07614536, -0.175332853), (11.906096413, -0.371919863))
            ThreePointArc((11.906096413, -0.371919863), (12.272100043, -1.083984489), (12.3982801, -1.874600251))
            ThreePointArc((12.3982801, -1.874600251), (12.368861124, -2.260064807), (12.281285672, -2.636600251))
            Line((12.281285672, -2.636600251), (12.546363432, -2.636600251))
            ThreePointArc((12.546363432, -2.636600251), (12.602645637, -1.350297092), (12.07614536, -0.175332853))
        make_face()
        with BuildLine():
            ThreePointArc((12.3982801, -1.874600251), (12.272100043, -1.083984489), (11.906096413, -0.371919863))
            ThreePointArc((11.906096413, -0.371919863), (7.352435653, -2.289743123), (12.281285672, -2.636600251))
            ThreePointArc((12.281285672, -2.636600251), (12.368861124, -2.260064807), (12.3982801, -1.874600251))
        make_face()
        with Locations(Location((9.8582801, -1.874600251, 0), (0, 0, 180))):
            Circle(SKETCH62_R, mode=Mode.SUBTRACT)
    extrude(amount=BOSS_EXTRUDE26_DEPTH)

    # Sketch65 → Boss-Extrude27 (add)
    with BuildSketch(Plane.ZY.offset(-137.414)):
        with BuildLine():
            ThreePointArc((-12.281285672, -2.636600251), (-12.364124548, -1.459457379), (-11.906096413, -0.371919863))
            Line((-11.906096413, -0.371919863), (-12.07614536, -0.175332853))
            ThreePointArc((-12.07614536, -0.175332853), (-12.602645637, -1.350297092), (-12.546363432, -2.636600251))
            Line((-12.546363432, -2.636600251), (-12.281285672, -2.636600251))
        make_face()
        with BuildLine():
            ThreePointArc((-7.3182801, -1.874600251), (-9.067664339, 0.539219692), (-11.906096413, -0.371919863))
            ThreePointArc((-11.906096413, -0.371919863), (-12.364124548, -1.459457379), (-12.281285672, -2.636600251))
            ThreePointArc((-12.281285672, -2.636600251), (-9.472815544, -4.385181275), (-7.3182801, -1.874600251))
        make_face()
        with Locations((-9.8582801, -1.874600251)):
            Circle(SKETCH65_R, mode=Mode.SUBTRACT)
    extrude(amount=BOSS_EXTRUDE27_DEPTH)

    # Sketch67 → Cut-Extrude32 (cut)
    with BuildSketch(Plane(origin=(162.56, 0, 0), x_dir=(0, 0, -1), z_dir=(1, 0, 0))):
        with Locations((9.8582801, -1.874600251)):
            Circle(SKETCH67_R)
    extrude(amount=-CUT_EXTRUDE32_DEPTH, mode=Mode.SUBTRACT)

    # Sketch68 → Cut-Extrude33 (cut)
    with BuildSketch(Plane.ZY.offset(-111.76)):
        with Locations((-9.8582801, -1.874600251)):
            Circle(SKETCH68_R)
    extrude(amount=-CUT_EXTRUDE33_DEPTH, mode=Mode.SUBTRACT)

    # Sketch72 → Cut-Extrude34 (cut)
    with BuildSketch(Plane.ZY.offset(-12.573)):
        with Locations((-9.8582801, -1.874600251)):
            Circle(SKETCH72_R)
    extrude(amount=-CUT_EXTRUDE34_DEPTH, mode=Mode.SUBTRACT)

    # Sketch74 → Boss-Extrude28 (add)
    with BuildSketch(Plane.ZY.offset(-12.573)):
        with BuildLine():
            Line((-12.546363432, -2.636600251), (-12.281285672, -2.636600251))
            ThreePointArc((-12.281285672, -2.636600251), (-7.352435653, -2.289743123), (-11.906096413, -0.371919863))
            Line((-11.906096413, -0.371919863), (-12.07614536, -0.175332853))
            ThreePointArc((-12.07614536, -0.175332853), (-12.602645637, -1.350297092), (-12.546363432, -2.636600251))
        make_face()
    extrude(amount=-BOSS_EXTRUDE28_DEPTH)

    # Sketch77 → Boss-Extrude29 (add)
    with BuildSketch(Plane.ZY.offset(-124.587)):
        with BuildLine():
            ThreePointArc((-11.906096413, -0.371919863), (-12.364124548, -1.459457379), (-12.281285672, -2.636600251))
            ThreePointArc((-12.281285672, -2.636600251), (-9.472815544, -4.385181275), (-7.3182801, -1.874600251))
            ThreePointArc((-7.3182801, -1.874600251), (-9.067664339, 0.539219692), (-11.906096413, -0.371919863))
        make_face()
        with Locations((-9.8582801, -1.874600251)):
            Circle(SKETCH77_R, mode=Mode.SUBTRACT)
        with BuildLine():
            Line((-12.546363432, -2.636600251), (-12.281285672, -2.636600251))
            ThreePointArc((-12.281285672, -2.636600251), (-12.364124548, -1.459457379), (-11.906096413, -0.371919863))
            Line((-11.906096413, -0.371919863), (-12.07614536, -0.175332853))
            ThreePointArc((-12.07614536, -0.175332853), (-12.602645637, -1.350297092), (-12.546363432, -2.636600251))
        make_face()
    extrude(amount=BOSS_EXTRUDE29_DEPTH)

    # Sketch79 → Cut-Extrude35 (cut)
    with BuildSketch(Plane.ZY):
        with Locations((-9.8582801, -1.874600251)):
            Circle(SKETCH79_R)
    extrude(amount=-CUT_EXTRUDE35_DEPTH, mode=Mode.SUBTRACT)

    # Sketch87 → Boss-Extrude30 (add)
    with BuildSketch(Plane(origin=(0, 4.983399749, 0), x_dir=(1, 0, 0), z_dir=(0, 1, 0))):
        with Locations((11.811, 23.2694801)):
            Rectangle(SKETCH87_W, SKETCH87_H)
    extrude(amount=-BOSS_EXTRUDE30_DEPTH)

    # Sketch88 → Cut-Extrude36 (cut)
    with BuildSketch(Plane(origin=(0, 0, -31.7784801), x_dir=(-1, 0, 0), z_dir=(0, 0, -1))):
        Polygon((0, 4.983399749), (0, -1.366600251), (-17.78, -1.366600251), (-23.622, 4.983399749), align=None)
    extrude(amount=-CUT_EXTRUDE36_DEPTH, mode=Mode.SUBTRACT)

    # Sketch89 → Boss-Extrude31 (add)
    with BuildSketch(Plane.ZY):
        with Locations((-31.0545801, 1.808399749)):
            Rectangle(SKETCH89_W, SKETCH89_H)
    extrude(amount=-BOSS_EXTRUDE31_DEPTH)

    # Sketch92 → Boss-Extrude33 (add)
    with BuildSketch(Plane(origin=(162.56, 0, 0), x_dir=(0, 0, -1), z_dir=(1, 0, 0))):
        with Locations((23.5996801, 1.173399749)):
            Rectangle(SKETCH92_W, SKETCH92_H)
    extrude(amount=-BOSS_EXTRUDE33_DEPTH)

    # Sketch94 → Boss-Extrude34 (add)
    with BuildSketch(Plane(origin=(162.56, 0, 0), x_dir=(0, 0, -1), z_dir=(1, 0, 0))):
        with BuildLine():
            ThreePointArc((12.07614536, -0.175332853), (12.602645637, -1.350297092), (12.546363432, -2.636600251))
            Line((12.546363432, -2.636600251), (31.7784801, -2.636600251))
            Line((31.7784801, -2.636600251), (31.7784801, 4.983399749))
            Line((31.7784801, 4.983399749), (16.5384801, 4.983399749))
            Line((16.5384801, 4.983399749), (12.07614536, -0.175332853))
        make_face()
    extrude(amount=BOSS_EXTRUDE34_DEPTH)

    # Sketch95 → Cut-Extrude37 (cut)
    with BuildSketch(Plane.ZY):
        with Locations((-23.5996801, 1.808399749)):
            Rectangle(SKETCH95_W, SKETCH95_H)
    extrude(amount=-CUT_EXTRUDE37_DEPTH, mode=Mode.SUBTRACT)

    # Sketch96 → Boss-Extrude35 (add)
    with BuildSketch(Plane(origin=(0, 0, -31.7784801), x_dir=(-1, 0, 0), z_dir=(0, 0, -1))):
        Polygon((-35.840922937, -2.228677314), (-43.053, -2.228677314), (-43.053, 4.983399749), align=None)
    extrude(amount=-BOSS_EXTRUDE35_DEPTH)

    # Sketch97 → Cut-Extrude38 (cut)
    with BuildSketch(Plane(origin=(176.022, 0, 0), x_dir=(0, 0, -1), z_dir=(1, 0, 0))):
        with Locations((23.5996801, 2.252899749)):
            Rectangle(SKETCH97_W, SKETCH97_H)
    extrude(amount=-CUT_EXTRUDE38_DEPTH, mode=Mode.SUBTRACT)

    # Sketch98 → Boss-Extrude36 (add)
    with BuildSketch(Plane(origin=(0, 0, -31.7784801), x_dir=(-1, 0, 0), z_dir=(0, 0, -1))):
        Polygon((-132.969, 4.983399749), (-139.89015762, -1.937757871), (-132.969, -1.937757871), align=None)
    extrude(amount=-BOSS_EXTRUDE36_DEPTH)

    # Sketch99 → Boss-Extrude37 (add)
    with BuildSketch(Plane(origin=(176.022, 0, 0), x_dir=(0, 0, -1), z_dir=(1, 0, 0))):
        with Locations((23.5996801, 2.252899749)):
            Rectangle(SKETCH99_W, SKETCH99_H)
    extrude(amount=-BOSS_EXTRUDE37_DEPTH)


solid = part.part
